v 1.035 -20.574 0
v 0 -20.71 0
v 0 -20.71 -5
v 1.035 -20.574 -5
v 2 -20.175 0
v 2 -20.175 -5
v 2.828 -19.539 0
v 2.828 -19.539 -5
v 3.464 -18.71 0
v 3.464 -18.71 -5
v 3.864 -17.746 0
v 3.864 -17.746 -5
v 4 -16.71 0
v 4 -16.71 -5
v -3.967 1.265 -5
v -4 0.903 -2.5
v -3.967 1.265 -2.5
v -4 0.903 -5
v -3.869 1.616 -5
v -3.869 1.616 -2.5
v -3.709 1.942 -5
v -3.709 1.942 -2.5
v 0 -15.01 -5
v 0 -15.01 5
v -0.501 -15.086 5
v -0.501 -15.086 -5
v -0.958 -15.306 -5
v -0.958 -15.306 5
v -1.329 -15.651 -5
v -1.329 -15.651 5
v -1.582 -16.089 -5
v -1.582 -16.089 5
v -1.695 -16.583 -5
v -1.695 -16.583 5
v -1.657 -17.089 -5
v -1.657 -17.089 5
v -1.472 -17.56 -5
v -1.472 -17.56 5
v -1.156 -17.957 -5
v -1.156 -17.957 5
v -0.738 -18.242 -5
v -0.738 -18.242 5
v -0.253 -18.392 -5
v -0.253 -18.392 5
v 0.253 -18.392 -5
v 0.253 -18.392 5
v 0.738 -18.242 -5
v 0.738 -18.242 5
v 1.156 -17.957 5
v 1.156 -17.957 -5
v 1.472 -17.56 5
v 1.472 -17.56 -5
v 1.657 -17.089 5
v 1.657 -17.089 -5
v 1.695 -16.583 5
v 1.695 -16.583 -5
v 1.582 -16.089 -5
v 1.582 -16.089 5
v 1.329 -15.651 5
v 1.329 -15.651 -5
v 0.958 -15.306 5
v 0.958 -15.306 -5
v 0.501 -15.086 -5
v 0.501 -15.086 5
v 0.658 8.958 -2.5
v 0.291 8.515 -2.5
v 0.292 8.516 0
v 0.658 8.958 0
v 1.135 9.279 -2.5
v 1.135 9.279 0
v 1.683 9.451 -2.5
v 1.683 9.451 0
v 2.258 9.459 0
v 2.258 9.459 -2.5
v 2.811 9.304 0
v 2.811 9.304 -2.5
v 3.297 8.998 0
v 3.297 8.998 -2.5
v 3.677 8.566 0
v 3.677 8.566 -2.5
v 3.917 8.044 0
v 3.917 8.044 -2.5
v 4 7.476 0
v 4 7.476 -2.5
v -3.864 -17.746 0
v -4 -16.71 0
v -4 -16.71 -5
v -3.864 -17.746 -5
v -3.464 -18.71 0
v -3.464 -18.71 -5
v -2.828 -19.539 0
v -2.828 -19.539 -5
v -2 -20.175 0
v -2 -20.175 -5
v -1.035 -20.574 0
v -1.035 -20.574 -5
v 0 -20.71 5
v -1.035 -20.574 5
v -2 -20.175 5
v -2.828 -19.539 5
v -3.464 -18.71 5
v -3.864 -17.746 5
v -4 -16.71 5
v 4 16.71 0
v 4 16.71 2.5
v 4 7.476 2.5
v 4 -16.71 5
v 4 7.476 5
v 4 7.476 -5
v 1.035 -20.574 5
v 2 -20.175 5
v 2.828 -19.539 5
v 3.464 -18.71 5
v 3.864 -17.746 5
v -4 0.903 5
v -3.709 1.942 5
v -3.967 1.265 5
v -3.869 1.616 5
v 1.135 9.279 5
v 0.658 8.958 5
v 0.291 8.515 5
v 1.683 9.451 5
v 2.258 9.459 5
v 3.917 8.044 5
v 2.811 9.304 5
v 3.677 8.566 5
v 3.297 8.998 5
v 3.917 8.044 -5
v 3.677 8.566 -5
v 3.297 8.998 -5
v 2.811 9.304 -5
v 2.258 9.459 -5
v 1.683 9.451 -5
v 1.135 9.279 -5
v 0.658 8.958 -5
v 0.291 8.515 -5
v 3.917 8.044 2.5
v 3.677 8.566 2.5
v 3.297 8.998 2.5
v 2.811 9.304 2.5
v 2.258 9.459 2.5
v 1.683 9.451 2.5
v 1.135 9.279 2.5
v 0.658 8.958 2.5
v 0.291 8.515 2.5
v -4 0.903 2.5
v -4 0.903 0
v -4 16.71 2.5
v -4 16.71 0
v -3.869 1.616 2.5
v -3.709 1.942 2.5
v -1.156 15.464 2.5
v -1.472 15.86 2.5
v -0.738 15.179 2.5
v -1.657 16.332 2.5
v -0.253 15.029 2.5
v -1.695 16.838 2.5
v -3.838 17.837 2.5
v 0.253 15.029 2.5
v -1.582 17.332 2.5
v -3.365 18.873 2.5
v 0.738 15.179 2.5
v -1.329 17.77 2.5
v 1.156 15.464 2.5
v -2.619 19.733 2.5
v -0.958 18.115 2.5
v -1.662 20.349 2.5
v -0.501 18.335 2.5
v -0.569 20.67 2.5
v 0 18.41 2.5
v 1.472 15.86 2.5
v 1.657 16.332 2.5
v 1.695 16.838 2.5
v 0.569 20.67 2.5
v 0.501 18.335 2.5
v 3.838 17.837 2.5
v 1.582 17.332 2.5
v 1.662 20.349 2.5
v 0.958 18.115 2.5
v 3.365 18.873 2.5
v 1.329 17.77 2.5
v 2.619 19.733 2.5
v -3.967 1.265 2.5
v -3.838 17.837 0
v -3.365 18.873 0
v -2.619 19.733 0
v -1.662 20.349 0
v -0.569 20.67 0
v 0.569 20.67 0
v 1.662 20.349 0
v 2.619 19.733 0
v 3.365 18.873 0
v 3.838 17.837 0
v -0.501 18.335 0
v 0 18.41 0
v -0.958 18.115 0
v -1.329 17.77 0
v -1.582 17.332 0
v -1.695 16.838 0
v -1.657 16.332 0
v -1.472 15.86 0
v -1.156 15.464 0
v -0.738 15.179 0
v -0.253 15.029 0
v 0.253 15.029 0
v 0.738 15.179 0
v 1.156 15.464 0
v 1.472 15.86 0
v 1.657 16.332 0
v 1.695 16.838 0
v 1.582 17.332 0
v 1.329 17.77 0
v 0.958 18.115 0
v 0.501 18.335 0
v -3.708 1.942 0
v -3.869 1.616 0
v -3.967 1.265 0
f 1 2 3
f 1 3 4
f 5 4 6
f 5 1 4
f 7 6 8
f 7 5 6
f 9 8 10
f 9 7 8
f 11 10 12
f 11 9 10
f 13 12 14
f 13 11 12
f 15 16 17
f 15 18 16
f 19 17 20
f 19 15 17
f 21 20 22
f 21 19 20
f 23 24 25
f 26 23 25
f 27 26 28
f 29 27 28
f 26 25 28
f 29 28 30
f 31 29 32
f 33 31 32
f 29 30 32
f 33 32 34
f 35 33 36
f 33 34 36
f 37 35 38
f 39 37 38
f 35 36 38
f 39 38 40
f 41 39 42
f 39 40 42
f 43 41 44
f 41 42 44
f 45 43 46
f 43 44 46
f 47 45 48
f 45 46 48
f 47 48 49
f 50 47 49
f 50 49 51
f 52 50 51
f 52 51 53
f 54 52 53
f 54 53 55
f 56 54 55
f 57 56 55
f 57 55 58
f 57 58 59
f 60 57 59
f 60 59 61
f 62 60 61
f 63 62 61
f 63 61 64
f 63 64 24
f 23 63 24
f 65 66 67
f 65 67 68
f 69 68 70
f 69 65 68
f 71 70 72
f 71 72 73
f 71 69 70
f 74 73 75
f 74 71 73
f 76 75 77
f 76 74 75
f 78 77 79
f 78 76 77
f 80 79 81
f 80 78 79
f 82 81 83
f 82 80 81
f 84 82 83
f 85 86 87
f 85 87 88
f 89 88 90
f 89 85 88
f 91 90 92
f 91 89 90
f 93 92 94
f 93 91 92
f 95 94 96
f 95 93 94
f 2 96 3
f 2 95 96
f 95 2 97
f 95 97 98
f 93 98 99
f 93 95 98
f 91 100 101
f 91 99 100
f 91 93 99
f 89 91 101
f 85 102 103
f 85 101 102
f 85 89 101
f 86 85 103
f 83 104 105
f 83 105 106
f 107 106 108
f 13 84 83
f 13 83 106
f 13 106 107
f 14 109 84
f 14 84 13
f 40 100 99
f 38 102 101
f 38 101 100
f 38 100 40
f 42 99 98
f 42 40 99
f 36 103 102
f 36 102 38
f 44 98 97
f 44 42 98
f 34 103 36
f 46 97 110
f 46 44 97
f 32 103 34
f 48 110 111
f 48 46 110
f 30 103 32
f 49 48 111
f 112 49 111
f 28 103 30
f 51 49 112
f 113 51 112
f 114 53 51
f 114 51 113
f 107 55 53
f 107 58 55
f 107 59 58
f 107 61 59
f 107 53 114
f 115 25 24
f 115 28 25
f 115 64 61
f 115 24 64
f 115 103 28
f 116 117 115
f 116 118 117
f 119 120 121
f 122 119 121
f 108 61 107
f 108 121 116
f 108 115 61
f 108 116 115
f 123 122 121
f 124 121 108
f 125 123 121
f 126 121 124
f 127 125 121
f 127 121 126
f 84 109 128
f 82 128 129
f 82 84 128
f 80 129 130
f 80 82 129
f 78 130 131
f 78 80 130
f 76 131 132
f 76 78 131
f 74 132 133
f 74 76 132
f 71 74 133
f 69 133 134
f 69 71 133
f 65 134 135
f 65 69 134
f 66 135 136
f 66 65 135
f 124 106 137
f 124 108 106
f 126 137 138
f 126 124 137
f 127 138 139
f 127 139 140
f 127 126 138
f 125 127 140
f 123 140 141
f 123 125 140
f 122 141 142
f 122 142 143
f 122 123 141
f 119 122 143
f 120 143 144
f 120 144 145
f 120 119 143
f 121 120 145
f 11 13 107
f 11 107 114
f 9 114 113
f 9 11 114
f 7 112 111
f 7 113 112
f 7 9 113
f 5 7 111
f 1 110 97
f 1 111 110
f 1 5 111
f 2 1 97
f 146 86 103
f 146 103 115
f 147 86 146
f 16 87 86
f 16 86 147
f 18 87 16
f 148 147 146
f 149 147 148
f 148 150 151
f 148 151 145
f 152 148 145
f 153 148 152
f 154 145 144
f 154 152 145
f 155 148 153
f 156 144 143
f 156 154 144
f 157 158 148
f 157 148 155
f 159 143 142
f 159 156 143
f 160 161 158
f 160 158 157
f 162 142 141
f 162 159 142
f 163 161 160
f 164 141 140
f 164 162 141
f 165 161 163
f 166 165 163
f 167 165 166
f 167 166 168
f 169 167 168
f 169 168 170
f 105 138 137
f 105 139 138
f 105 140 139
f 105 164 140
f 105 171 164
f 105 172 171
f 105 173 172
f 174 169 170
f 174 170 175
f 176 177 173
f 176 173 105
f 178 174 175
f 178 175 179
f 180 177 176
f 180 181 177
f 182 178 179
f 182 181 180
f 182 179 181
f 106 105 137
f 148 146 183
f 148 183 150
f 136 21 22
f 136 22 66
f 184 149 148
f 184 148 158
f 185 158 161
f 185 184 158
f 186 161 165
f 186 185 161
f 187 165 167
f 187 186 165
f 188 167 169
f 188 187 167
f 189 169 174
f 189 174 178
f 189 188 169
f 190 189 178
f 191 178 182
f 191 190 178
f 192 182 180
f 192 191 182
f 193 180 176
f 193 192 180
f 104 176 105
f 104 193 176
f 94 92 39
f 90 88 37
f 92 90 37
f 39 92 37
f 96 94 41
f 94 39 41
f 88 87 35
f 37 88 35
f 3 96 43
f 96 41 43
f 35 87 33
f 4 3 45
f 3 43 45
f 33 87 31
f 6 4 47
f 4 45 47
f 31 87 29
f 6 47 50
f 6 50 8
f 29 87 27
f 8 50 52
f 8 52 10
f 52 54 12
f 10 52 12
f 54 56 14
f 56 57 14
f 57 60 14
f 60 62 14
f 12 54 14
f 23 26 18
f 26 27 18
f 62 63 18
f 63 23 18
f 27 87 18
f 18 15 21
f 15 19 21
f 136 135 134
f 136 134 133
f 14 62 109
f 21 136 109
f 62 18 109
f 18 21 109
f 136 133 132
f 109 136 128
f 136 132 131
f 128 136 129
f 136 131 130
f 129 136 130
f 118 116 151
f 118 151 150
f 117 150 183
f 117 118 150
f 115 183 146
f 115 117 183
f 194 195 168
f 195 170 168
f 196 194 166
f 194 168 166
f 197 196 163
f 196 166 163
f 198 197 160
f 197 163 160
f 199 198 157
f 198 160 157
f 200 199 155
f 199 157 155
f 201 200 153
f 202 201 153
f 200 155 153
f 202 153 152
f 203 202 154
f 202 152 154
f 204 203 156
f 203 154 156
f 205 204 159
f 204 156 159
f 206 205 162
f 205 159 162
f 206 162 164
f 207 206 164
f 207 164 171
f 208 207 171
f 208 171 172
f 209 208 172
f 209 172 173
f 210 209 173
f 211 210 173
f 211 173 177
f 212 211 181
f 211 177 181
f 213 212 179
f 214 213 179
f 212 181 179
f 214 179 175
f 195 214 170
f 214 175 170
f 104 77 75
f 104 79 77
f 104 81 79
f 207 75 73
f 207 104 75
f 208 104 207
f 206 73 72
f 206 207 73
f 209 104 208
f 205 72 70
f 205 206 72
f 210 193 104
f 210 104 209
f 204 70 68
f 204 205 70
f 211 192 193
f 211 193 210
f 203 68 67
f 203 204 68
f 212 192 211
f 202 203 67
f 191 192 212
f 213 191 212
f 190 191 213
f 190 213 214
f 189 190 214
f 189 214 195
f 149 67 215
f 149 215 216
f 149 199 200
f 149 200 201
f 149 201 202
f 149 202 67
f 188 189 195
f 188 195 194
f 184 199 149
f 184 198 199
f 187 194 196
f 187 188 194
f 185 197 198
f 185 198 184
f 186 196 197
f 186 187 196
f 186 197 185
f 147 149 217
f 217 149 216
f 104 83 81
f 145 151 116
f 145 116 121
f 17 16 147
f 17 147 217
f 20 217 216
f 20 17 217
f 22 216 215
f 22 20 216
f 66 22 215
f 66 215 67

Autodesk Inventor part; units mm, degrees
ref_plane "YZ Plane" through (0, 0, 0) normal (1, 0, 0) x (0, 1, 0)
ref_plane "XZ Plane" through (0, 0, 0) normal (0, 1, 0) x (-1, 0, 0)
ref_plane "XY Plane" through (0, 0, 0) normal (0, 0, 1) x (1, 0, 0)
sketch "Sketch1" plane through (0, 0, 0) normal (0, 0, 1) x (1, 0, 0)
  line L0 (0, 20.7105) -> (0, 20.7105)
  line L1 (4, 16.7105) -> (4, 14.6095)
  line L2 (0, -20.7105) -> (0, -20.7105)
  line L3 (-4, -16.7105) -> (-4, 1.4635)
  line L4 (-4, 20.7105) -> (0, 20.7105) construction
  line L5 (0, 20.7105) -> (0, 0) construction
  line L6 (0, 0) -> (-4, 0) construction
  line L7 (-4, 0) -> (-4, 20.7105) construction
  arc A0 (4, 16.7105) -> (0, 20.7105) centre (0, 16.7105) ccw
  arc A1 (0, 20.7105) -> (-4, 16.7105) centre (0, 16.7105) ccw
  arc A2 (-4, -16.7105) -> (0, -20.7105) centre (0, -16.7105) ccw
  arc A3 (0, -20.7105) -> (4, -16.7105) centre (0, -16.7105) ccw
  line L8 (-4, 1.4635) -> (4, 14.6095)
  line L9 (-4, 1.4635) -> (-4, 16.7105)
  line L10 (4, 14.6095) -> (4, -16.7105)
  dimension "d0" = 4
  dimension "d6" = 33.421
extrude "Extrusion2" add sketch "Sketch1" along normal mid plane 5 contours L1 L8 L9 A1 A0
extrude "Extrusion3" add sketch "Sketch1" along normal mid plane 10 contours L10 A3 A2 L3 L8
fillet "Fillet1" radius 2 4 edges at (4, 14.6095, -3.75) (-4, 1.4635, -3.75) (4, 14.6095, 3.75) (-4, 1.4635, 3.75)
sketch "Sketch3" plane through (0, 0, -5) normal (0, 0, -1) x (-1, 0, 0)
  arc A0 (-4, -16.7105) -> (4, -16.7105) centre (0, -16.7105) ccw projected
  arc A1 (4, 16.7105) -> (-4, 16.7105) centre (0, 16.7105) ccw projected
  line L0 (-4, 7.4758) -> (-4, 16.7105) projected
  arc A2 (-0.2915, 8.5155) -> (-4, 7.4758) centre (-2, 7.4758) ccw projected
  line L1 (3.7085, 1.9425) -> (-0.2915, 8.5155) projected
  arc A3 (4, 0.9028) -> (3.7085, 1.9425) centre (2, 0.9028) ccw projected
  line L2 (4, 0.9028) -> (4, 16.7105) projected
  point P0 (0, 0)
hole "Hole2" at (0, 16.7105, -5) at (0, -16.7105, -5) direction (0, 0, 1) diameter 3.4 end through all clearance for "Socket Head Cap Screw" size "M3" standard "Ansi Metric M Profile"
sketch "Sketch4" plane through (0, 0, -2.5) normal (0, 0, -1) x (-1, 0, 0)
  circle A0 centre (0, 16.7105) radius 1.7 projected
  arc A1 (4, 16.7105) -> (-4, 16.7105) centre (0, 16.7105) ccw projected
  line L0 (-4, 7.4758) -> (-4, 16.7105) projected
  arc A2 (-0.2915, 8.5155) -> (-4, 7.4758) centre (-2, 7.4758) ccw projected
  line L1 (3.7085, 1.9425) -> (-0.2915, 8.5155) projected
  arc A3 (4, 0.9028) -> (3.7085, 1.9425) centre (2, 0.9028) ccw projected
  line L2 (4, 0.9028) -> (4, 16.7105) projected
  point P0 (0, 0)
extrude "Extrusion4" cut sketch "Sketch4" against normal up to surface (2.5 mm away)
equation "\"d6\" = LengthJ"
equation "\"LengthJ\" = 33.421041"
properties part number "F"
